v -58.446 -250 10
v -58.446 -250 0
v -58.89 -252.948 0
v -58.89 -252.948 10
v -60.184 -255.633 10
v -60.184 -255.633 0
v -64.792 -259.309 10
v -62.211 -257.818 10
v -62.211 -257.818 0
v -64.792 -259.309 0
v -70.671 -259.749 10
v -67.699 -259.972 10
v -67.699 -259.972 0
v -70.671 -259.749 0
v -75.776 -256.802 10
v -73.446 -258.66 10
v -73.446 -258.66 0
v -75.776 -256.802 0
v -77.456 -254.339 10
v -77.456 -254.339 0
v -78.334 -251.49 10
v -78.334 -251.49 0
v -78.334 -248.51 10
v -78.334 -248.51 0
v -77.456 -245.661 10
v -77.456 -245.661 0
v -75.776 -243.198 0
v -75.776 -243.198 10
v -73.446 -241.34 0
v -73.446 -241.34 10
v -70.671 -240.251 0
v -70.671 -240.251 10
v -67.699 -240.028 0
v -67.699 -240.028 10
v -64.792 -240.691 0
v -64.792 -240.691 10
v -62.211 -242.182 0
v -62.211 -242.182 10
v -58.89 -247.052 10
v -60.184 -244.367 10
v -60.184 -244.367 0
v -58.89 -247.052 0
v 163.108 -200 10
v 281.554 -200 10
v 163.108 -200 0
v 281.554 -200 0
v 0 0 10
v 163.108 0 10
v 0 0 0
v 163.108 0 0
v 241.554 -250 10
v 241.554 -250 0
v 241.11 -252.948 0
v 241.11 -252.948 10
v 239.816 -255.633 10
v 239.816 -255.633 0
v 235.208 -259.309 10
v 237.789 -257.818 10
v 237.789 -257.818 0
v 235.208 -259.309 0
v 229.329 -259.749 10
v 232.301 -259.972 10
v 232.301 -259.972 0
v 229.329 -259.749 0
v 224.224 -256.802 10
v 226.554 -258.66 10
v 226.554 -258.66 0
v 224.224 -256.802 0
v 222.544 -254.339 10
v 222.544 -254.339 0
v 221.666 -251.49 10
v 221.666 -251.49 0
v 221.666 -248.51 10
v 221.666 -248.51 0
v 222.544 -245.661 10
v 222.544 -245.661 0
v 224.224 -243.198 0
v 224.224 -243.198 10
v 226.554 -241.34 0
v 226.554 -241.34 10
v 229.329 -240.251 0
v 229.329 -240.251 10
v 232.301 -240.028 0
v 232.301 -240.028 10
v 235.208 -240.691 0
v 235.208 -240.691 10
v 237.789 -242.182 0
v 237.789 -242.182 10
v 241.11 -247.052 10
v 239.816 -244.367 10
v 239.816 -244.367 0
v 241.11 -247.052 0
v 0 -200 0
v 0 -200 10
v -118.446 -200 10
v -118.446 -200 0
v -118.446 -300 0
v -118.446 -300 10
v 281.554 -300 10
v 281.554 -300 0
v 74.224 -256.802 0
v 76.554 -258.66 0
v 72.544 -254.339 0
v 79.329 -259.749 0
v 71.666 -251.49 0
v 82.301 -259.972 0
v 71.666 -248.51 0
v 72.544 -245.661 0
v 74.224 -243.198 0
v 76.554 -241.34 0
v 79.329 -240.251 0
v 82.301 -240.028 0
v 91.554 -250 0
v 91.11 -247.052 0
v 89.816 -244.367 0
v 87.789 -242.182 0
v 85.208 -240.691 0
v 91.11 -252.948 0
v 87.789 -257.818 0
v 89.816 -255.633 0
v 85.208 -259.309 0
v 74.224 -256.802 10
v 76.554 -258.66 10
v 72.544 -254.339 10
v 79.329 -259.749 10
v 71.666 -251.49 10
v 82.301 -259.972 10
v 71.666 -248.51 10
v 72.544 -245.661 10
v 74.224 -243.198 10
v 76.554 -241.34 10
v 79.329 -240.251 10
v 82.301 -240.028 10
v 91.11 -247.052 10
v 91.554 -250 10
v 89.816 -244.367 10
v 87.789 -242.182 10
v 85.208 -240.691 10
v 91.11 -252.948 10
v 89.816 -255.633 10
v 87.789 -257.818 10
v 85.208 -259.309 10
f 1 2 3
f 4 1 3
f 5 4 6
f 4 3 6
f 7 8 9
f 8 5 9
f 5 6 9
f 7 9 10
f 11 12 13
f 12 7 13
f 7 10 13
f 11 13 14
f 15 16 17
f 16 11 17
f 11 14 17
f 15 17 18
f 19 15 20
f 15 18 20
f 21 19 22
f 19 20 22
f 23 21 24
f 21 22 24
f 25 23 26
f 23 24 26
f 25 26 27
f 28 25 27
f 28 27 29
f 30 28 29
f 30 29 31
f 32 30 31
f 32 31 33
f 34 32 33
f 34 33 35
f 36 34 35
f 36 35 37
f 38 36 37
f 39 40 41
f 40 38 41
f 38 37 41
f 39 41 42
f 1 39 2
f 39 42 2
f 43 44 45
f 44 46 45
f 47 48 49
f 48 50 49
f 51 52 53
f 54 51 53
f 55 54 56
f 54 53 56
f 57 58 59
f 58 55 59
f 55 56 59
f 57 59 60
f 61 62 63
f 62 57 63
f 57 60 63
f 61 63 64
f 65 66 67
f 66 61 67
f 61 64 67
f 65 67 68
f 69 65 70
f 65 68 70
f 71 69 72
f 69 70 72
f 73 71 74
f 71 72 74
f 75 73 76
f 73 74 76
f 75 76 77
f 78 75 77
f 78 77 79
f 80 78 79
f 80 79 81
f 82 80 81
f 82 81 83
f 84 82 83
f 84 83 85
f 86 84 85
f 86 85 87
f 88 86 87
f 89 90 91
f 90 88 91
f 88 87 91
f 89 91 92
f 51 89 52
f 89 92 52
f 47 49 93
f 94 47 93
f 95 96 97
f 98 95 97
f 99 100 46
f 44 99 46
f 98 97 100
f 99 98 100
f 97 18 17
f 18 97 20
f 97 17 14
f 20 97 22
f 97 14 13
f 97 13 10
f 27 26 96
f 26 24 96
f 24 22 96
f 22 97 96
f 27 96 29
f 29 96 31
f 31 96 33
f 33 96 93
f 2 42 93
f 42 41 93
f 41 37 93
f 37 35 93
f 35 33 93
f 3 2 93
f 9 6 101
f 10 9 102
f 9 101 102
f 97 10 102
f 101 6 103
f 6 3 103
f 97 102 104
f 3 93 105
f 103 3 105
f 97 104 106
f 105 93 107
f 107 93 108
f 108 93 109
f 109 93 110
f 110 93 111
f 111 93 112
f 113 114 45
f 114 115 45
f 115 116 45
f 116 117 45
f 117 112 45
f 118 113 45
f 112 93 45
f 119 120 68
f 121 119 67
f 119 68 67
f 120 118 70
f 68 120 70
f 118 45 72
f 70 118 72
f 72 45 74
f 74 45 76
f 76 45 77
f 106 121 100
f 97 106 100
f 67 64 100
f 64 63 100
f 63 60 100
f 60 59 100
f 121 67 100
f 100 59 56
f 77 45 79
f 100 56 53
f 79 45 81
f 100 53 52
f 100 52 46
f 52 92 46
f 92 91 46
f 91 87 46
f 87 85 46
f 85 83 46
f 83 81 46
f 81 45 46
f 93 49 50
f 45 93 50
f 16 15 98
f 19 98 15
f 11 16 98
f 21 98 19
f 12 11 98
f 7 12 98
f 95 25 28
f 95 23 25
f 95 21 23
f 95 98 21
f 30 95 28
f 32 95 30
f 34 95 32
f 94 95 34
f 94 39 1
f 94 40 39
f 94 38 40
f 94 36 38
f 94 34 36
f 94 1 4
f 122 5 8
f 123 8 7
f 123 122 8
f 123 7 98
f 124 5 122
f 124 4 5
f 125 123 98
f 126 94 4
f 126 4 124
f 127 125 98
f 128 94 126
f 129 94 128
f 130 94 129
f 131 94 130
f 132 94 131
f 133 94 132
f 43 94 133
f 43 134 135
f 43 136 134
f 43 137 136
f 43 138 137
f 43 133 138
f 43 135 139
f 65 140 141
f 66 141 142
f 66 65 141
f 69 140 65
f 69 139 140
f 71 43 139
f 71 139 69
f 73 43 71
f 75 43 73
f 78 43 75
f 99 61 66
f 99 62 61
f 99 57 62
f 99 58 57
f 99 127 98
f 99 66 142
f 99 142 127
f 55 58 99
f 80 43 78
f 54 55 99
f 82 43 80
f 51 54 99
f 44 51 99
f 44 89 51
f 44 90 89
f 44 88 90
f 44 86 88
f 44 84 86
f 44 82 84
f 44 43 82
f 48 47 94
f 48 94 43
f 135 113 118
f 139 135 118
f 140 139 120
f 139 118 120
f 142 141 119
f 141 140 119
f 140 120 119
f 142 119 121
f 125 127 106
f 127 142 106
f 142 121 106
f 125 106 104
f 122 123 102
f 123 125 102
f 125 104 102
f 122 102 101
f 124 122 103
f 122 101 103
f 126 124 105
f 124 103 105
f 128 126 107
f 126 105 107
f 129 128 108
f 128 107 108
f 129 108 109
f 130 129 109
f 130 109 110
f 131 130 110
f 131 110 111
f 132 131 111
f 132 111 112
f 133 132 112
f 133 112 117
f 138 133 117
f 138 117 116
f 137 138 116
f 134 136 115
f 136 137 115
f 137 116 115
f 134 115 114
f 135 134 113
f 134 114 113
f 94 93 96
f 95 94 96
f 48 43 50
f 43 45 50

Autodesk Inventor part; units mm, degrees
ref_plane "YZ Plane" through (0, 0, 0) normal (1, 0, 0) x (0, 1, 0)
ref_plane "XZ Plane" through (0, 0, 0) normal (0, 1, 0) x (-1, 0, 0)
ref_plane "XY Plane" through (0, 0, 0) normal (0, 0, 1) x (1, 0, 0)
sketch "Skizze1" plane through (0, 0, 0) normal (0, 0, 1) x (1, 0, 0)
  line L0 (163.1081, -200) -> (163.1081, 0)
  line L1 (163.1081, 0) -> (0, 0)
  line L2 (0, 0) -> (0, -200)
  line L3 (0, -200) -> (-118.4459, -200)
  line L4 (-118.4459, -200) -> (-118.4459, -300)
  line L5 (-118.4459, -300) -> (281.5541, -300)
  line L6 (281.5541, -300) -> (281.5541, -200)
  line L7 (281.5541, -200) -> (163.1081, -200)
  circle A0 centre (231.5541, -250) radius 10
  circle A1 centre (-68.4459, -250) radius 10
  circle A2 centre (81.5541, -250) radius 10
  dimension "d0" = 20
  dimension "d1" = 90
  dimension "d2" = 118.4459
  dimension "d3" = 281.5541
  dimension "d4" = 400
  dimension "d5" = 200
  dimension "d6" = 100
  dimension "d7" = 281.5541
  dimension "d8" = 200
  dimension "d9" = 200
  dimension "d10" = 0
  dimension "d11" = 0
  dimension "d12" = 100
  dimension "d13" = 0
  dimension "d14" = 50
  dimension "d15" = 50
  dimension "d16" = 200
  dimension "d17" = 118.4459
  dimension "d18" = 0
  dimension "d19" = 118.4459
  dimension "d20" = 200
  dimension "d21" = 50
  dimension "d22" = 200
  dimension "d23" = 281.5541
  dimension "d24" = 0
  dimension "d25" = 281.5541
  dimension "d26" = 350
  dimension "d27" = 50
  dimension "d28" = 0
  dimension "d29" = 400
  dimension "d30" = 100
  dimension "d31" = 400
extrude "Extrusion1" add sketch "Skizze1" along normal blind 10
properties part number "aussenOben"
